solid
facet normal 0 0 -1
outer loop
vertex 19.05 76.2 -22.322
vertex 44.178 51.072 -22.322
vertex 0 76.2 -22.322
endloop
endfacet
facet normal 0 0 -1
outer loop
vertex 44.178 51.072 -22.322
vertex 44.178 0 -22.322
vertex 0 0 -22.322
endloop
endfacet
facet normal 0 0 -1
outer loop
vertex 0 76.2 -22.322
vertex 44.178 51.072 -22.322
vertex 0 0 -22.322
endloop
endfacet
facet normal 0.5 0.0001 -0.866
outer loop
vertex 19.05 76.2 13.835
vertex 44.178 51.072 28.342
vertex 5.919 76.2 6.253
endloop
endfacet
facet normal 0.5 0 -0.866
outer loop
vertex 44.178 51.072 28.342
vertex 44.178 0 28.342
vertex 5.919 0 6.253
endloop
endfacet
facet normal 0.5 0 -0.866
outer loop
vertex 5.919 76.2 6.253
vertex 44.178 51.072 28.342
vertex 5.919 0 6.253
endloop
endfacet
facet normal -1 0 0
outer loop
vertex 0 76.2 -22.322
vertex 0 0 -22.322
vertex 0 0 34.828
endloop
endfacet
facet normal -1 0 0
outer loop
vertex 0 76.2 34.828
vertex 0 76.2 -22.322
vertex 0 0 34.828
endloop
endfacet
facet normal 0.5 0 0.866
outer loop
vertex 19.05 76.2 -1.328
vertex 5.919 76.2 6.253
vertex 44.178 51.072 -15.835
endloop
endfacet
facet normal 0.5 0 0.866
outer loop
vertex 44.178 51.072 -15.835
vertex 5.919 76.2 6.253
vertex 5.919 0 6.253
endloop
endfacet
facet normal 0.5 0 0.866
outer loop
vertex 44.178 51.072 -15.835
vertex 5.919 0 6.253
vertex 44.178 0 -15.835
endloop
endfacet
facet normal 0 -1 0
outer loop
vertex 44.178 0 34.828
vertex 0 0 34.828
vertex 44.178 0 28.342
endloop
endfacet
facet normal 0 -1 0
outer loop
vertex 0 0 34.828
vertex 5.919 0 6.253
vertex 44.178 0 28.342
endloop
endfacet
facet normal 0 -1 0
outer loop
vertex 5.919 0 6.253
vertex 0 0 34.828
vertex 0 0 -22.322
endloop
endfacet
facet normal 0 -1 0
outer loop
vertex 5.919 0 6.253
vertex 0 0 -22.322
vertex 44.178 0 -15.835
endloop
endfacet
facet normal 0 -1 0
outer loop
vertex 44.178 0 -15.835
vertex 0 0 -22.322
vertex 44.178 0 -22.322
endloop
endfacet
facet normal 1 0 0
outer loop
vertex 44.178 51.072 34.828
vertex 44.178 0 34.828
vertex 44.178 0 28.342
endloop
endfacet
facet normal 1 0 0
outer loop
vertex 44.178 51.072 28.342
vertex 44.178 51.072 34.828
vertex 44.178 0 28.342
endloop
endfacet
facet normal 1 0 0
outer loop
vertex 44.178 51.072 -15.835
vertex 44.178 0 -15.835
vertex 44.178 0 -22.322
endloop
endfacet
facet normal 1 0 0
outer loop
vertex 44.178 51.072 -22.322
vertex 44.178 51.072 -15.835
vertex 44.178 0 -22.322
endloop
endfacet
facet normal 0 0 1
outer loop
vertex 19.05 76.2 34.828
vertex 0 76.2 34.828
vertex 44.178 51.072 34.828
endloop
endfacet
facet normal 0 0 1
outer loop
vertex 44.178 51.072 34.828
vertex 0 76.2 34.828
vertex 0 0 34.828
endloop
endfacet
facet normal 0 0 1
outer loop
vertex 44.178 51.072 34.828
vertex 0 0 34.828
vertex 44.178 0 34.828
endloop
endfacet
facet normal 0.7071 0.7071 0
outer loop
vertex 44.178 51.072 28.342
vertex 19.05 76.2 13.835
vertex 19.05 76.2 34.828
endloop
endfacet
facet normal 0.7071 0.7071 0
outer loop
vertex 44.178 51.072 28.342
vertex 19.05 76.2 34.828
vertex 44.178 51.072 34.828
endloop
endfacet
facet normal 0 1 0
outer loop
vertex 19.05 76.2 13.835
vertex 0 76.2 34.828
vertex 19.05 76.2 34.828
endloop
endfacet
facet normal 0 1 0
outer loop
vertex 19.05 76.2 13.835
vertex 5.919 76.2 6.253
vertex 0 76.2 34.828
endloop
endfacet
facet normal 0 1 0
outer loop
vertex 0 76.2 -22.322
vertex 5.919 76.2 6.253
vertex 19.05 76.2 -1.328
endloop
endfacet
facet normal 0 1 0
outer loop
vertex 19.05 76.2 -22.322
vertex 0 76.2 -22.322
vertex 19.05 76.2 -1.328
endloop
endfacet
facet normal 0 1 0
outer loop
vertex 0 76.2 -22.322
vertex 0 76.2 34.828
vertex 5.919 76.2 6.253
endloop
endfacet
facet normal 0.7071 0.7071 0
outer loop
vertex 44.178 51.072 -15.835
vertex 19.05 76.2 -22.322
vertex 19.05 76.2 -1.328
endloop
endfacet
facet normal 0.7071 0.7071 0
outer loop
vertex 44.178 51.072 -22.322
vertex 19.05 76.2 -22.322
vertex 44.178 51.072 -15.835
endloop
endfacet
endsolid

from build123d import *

# Parameters (mm, degrees)
BOSS_EXTRUDE1_DEPTH     = 76.2
CUT_EXTRUDE1_DEPTH      = 95.715964076
CUT_EXTRUDE1_DEPTH_BACK = 95.715964076


with BuildPart() as part:
    # Sketch1 → Boss-Extrude1 (new body)
    with BuildSketch(Plane(origin=(0, 0, 0), x_dir=(1, 0, 0), z_dir=(0, 1, 0))):
        Polygon((44.177534378, 22.321573291), (0, 22.321573291), (0, -34.828426709), (44.177534378, -34.828426709), (44.177534378, -28.342193898), (5.91866733, -6.253426709), (44.177534378, 15.83534048), align=None)
    extrude(amount=BOSS_EXTRUDE1_DEPTH)

    # Sketch3 → Cut-Extrude1 (cut, two sides: drawn at the far end of the back side and taken through both)
    with BuildSketch(Plane.XY.offset(-CUT_EXTRUDE1_DEPTH_BACK)):
        Polygon((-101.492059558, 196.742059558), (19.05, 76.2), (44.177534378, 51.072465622), (164.719593936, -69.469593936), (405.803713052, 171.61452518), (139.592059558, 437.826178674), align=None)
    extrude(amount=CUT_EXTRUDE1_DEPTH + CUT_EXTRUDE1_DEPTH_BACK, mode=Mode.SUBTRACT)


solid = part.part
